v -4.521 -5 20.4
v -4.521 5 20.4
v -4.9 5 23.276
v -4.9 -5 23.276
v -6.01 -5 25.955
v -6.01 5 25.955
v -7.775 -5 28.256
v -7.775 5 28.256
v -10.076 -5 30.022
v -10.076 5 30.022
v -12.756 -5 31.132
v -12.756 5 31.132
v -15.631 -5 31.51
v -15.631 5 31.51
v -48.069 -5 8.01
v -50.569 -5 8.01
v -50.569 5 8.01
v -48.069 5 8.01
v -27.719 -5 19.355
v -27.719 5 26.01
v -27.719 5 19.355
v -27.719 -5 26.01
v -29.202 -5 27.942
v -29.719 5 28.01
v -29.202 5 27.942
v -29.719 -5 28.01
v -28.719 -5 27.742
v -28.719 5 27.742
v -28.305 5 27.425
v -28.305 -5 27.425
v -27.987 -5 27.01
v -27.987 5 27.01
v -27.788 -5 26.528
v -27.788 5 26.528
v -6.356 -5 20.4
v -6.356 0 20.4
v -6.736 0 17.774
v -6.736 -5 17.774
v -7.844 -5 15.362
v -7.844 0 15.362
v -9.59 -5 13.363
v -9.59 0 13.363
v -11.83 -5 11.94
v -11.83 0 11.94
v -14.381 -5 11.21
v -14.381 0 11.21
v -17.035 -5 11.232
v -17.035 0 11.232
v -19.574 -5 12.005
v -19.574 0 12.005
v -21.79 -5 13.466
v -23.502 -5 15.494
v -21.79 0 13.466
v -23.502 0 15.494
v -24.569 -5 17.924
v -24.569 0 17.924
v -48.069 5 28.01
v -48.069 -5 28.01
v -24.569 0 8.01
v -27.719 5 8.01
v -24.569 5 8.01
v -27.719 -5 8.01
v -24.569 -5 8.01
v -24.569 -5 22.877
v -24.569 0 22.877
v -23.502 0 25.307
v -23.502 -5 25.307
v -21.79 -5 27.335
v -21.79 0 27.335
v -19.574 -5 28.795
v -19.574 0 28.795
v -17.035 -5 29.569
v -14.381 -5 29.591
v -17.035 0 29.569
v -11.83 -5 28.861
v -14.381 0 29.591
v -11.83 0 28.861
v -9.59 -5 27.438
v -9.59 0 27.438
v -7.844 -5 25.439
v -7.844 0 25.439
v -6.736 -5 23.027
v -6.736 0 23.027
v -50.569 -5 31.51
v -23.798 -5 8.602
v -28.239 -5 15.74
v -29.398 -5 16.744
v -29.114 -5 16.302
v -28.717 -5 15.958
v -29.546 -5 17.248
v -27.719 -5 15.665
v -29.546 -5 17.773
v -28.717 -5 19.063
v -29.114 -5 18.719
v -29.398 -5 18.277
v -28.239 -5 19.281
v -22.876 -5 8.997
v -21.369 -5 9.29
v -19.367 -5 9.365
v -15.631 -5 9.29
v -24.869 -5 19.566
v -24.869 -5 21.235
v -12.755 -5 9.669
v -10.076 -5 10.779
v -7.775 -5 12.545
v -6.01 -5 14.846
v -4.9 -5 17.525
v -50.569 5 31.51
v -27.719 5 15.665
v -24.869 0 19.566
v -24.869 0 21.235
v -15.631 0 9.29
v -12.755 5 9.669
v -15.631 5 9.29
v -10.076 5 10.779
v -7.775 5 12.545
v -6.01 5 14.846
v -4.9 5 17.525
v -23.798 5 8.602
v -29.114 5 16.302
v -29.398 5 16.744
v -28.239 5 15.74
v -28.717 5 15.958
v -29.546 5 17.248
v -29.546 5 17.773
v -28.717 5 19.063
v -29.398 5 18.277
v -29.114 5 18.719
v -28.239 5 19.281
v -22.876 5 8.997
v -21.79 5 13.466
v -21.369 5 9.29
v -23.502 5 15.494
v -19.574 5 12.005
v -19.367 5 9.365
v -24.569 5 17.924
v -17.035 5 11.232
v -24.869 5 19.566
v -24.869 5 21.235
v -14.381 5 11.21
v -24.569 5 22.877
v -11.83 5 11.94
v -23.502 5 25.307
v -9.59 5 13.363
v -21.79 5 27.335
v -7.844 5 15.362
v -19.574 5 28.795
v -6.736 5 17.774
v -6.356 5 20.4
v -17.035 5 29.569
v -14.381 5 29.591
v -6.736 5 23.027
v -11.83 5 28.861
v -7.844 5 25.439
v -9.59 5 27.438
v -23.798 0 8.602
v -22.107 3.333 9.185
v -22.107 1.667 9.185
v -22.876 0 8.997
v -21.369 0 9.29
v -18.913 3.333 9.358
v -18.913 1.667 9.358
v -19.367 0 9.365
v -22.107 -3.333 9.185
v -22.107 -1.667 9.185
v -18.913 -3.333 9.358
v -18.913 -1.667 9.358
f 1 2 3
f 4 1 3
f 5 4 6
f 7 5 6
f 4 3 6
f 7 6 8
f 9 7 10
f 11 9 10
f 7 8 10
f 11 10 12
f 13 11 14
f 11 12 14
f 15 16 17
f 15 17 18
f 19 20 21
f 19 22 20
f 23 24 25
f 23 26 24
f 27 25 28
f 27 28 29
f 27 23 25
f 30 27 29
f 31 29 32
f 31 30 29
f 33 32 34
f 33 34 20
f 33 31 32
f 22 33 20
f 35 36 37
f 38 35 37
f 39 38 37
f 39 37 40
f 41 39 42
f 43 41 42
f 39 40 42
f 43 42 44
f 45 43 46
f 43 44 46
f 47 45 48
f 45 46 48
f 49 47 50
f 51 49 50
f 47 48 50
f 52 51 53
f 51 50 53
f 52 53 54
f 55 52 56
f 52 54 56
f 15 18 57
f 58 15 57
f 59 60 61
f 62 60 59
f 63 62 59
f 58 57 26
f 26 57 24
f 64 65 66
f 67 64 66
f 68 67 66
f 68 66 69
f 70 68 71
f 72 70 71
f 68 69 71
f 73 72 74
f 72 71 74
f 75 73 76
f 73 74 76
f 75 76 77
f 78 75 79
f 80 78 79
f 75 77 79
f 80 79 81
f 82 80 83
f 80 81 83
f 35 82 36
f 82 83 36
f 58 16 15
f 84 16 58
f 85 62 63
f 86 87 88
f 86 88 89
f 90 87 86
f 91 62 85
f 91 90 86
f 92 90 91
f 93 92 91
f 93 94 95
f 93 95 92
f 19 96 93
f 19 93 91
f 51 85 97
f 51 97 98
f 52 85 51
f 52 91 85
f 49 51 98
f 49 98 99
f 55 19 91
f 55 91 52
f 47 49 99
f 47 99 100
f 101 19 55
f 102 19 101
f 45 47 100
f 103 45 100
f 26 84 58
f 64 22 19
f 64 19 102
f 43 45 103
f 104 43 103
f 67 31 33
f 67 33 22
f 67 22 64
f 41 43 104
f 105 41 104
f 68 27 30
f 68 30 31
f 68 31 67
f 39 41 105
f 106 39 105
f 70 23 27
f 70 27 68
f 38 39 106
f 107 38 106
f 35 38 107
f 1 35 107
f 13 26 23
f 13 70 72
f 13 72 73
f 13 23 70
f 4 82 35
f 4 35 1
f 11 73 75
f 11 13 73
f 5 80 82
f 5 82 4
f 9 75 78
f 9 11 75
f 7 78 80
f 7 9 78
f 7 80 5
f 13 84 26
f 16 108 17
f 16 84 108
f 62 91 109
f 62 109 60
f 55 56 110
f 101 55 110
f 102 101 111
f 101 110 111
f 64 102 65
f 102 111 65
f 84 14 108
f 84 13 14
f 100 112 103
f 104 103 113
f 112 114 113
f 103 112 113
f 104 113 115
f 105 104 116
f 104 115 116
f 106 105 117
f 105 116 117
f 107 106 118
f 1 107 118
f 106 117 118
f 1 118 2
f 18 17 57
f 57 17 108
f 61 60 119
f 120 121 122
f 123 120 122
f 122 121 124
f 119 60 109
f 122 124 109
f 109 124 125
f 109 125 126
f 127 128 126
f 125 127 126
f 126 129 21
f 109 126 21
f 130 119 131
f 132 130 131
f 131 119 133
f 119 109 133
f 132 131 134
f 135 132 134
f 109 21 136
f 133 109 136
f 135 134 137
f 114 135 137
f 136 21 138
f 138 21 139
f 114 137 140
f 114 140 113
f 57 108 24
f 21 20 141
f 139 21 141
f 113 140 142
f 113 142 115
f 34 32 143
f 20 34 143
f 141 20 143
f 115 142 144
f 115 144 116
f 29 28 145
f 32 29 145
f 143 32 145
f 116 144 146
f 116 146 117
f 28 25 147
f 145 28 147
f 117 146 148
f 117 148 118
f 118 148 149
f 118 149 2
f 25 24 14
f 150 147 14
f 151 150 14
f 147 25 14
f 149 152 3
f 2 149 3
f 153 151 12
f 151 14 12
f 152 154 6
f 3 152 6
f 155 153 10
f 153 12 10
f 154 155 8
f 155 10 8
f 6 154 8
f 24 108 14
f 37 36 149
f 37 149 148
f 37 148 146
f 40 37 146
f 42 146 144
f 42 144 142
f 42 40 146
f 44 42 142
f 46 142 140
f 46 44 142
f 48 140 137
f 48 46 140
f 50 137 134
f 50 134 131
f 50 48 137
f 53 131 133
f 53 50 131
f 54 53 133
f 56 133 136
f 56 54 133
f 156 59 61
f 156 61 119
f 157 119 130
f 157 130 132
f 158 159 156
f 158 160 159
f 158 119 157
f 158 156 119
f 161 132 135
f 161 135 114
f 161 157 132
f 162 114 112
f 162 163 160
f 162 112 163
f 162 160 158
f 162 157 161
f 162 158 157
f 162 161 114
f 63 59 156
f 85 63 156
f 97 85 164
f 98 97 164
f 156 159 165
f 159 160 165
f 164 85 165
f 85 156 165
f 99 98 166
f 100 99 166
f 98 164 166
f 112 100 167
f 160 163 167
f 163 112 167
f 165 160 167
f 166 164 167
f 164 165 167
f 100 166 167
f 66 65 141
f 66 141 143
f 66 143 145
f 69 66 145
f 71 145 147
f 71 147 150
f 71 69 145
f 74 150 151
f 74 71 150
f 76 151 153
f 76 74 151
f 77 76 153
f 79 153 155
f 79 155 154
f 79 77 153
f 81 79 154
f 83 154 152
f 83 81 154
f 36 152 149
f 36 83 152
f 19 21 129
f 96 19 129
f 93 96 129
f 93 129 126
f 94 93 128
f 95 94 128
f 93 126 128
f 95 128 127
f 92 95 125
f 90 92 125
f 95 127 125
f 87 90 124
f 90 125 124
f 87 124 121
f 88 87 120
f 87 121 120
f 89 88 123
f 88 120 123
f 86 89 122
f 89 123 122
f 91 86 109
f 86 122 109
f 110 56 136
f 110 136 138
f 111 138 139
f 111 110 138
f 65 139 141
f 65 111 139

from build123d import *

# Parameters (mm, degrees)
F1_DEPTH = 5


with BuildPart() as f1:
    # F0 (on Front) → F1 (new body, symmetric)
    with BuildSketch(Plane.XZ):
        with BuildLine():
            Line((-24.5694083333, 31.5104130507), (-50.5694083333, 31.5104130507))
            Line((-50.5694083333, 31.5104130507), (-50.5694083333, 8.0104130507))
            Line((-50.5694083333, 8.0104130507), (-48.0694083333, 8.0104130507))
            Line((-48.0694083333, 8.0104130507), (-48.0694083333, 28.0104130507))
            Line((-48.0694083333, 28.0104130507), (-29.7194083333, 28.0104130507))
            ThreePointArc((-29.7194083333, 28.0104130507), (-28.3051947709, 27.424626613), (-27.7194083333, 26.0104130507))
            Line((-27.7194083333, 26.0104130507), (-27.7194083333, 19.3554483443))
            Line((-27.7194083333, 19.3554483443), (-27.7194083333, 15.665377757))
            Line((-27.7194083333, 15.665377757), (-27.7194083333, 8.0104130507))
            Line((-27.7194083333, 8.0104130507), (-24.5694083333, 8.0104130507))
            Line((-24.5694083333, 8.0104130507), (-24.5694083333, 13.8020069146))
            ThreePointArc((-24.5694083333, 13.8020069146), (-26.7411284149, 20.4004295021), (-24.5694083333, 26.9988520897))
            Line((-24.5694083333, 26.9988520897), (-24.5694083333, 31.5104130507))
        make_face()
        with BuildLine():
            ThreePointArc((-15.6311448663, 31.5104130507), (-20.6373094688, 30.3185971969), (-24.5694083333, 26.9988520897))
            Line((-24.5694083333, 26.9988520897), (-24.5694083333, 22.8769333271))
            ThreePointArc((-24.5694083333, 22.8769333271), (-14.3814986476, 29.5908598146), (-6.3561448663, 20.4004295021))
            ThreePointArc((-6.3561448663, 20.4004295021), (-14.3814986476, 11.2099991897), (-24.5694083333, 17.9239256771))
            Line((-24.5694083333, 17.9239256771), (-24.5694083333, 13.8020069146))
            ThreePointArc((-24.5694083333, 13.8020069146), (-20.6371443338, 10.4821784577), (-15.630774911, 9.2904459598))
            ThreePointArc((-15.630774911, 9.2904459598), (-7.7750693624, 12.5446155962), (-4.5211613178, 20.4004295021))
            ThreePointArc((-4.5211613178, 20.4004295021), (-7.7752001603, 28.2563742082), (-15.6311448663, 31.5104130507))
        make_face()
        with BuildLine():
            Line((-24.5694083333, 22.8769333271), (-24.5694083333, 26.9988520897))
            ThreePointArc((-24.5694083333, 26.9988520897), (-26.7411284149, 20.4004295021), (-24.5694083333, 13.8020069146))
            Line((-24.5694083333, 13.8020069146), (-24.5694083333, 17.9239256771))
            ThreePointArc((-24.5694083333, 17.9239256771), (-24.9061448663, 20.4004295021), (-24.5694083333, 22.8769333271))
        make_face()
        with BuildLine():
            ThreePointArc((-15.630774911, 9.2904459598), (-20.6371443338, 10.4821784577), (-24.5694083333, 13.8020069146))
            Line((-24.5694083333, 13.8020069146), (-24.5694083333, 8.0104130507))
            add(Edge.make_bspline(
                [(-24.5694083333, 8.0104130507), (-22.6878308277, 9.9391806871), (-18.7427580517, 9.2241163725), (-15.630774911, 9.2904459598)],
                knots=[0, 0, 0, 0, 9.029820137, 9.029820137, 9.029820137, 9.029820137], degree=3))
        make_face()
        with BuildLine():
            Line((-27.7194083333, 15.665377757), (-27.7194083333, 19.3554483443))
            ThreePointArc((-27.7194083333, 19.3554483443), (-29.564443627, 17.5104130507), (-27.7194083333, 15.665377757))
        make_face()
        with BuildLine():
            Line((-15.6311448663, 31.5104130507), (-24.5694083333, 31.5104130507))
            Line((-24.5694083333, 31.5104130507), (-24.5694083333, 26.9988520897))
            ThreePointArc((-24.5694083333, 26.9988520897), (-20.6373094688, 30.3185971969), (-15.6311448663, 31.5104130507))
        make_face()
    extrude(amount=F1_DEPTH, both=True)


solid = f1.part
